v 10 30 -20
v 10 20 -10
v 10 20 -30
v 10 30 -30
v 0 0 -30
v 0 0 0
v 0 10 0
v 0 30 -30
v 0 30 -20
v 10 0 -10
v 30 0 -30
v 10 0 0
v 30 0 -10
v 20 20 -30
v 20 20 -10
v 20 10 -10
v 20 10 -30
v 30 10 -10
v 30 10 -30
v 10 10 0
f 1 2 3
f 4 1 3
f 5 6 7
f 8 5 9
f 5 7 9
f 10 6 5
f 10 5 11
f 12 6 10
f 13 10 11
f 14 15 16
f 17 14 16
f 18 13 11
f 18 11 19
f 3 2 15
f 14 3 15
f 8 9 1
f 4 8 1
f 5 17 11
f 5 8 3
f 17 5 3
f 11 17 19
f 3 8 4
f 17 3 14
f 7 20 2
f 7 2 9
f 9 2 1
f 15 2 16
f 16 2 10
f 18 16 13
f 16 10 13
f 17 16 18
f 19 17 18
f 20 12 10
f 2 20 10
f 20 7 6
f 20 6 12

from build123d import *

# Parameters (mm, degrees)
SKETCH_1_W               = 30
SKETCH_1_H               = 30
EXTRUDE_1_DEPTH          = 30
CUT_EXTRUDE_8_DEPTH      = 52.961524227
CUT_EXTRUDE_9_DEPTH      = 47.904157598
CUT_EXTRUDE_9_DEPTH_BACK = 47.904157598
SKETCH_16_W              = 20
SKETCH_16_H              = 10
CUT_EXTRUDE_10_DEPTH     = 52.961524227


with BuildPart() as part:
    # 草圖1 → 填料-伸1 (new body)
    with BuildSketch(Plane.XY):
        with Locations((15, 15)):
            Rectangle(SKETCH_1_W, SKETCH_1_H)
    extrude(amount=-EXTRUDE_1_DEPTH)

    # 草圖11 → 除料-伸長8 (cut, through all)
    with BuildSketch(Plane.XY):
        Polygon((10, 30), (10, 20), (20, 20), (20, 10), (30, 10), (30, 30), align=None)
    extrude(amount=-CUT_EXTRUDE_8_DEPTH, mode=Mode.SUBTRACT)

    # 草圖16 → 除料-伸長9 (cut, two sides: drawn at the far end of the back side and taken through both)
    with BuildSketch(Plane(origin=(0, 10, 0), x_dir=(1, 0, 0), z_dir=(0, 1, 0)).offset(-CUT_EXTRUDE_9_DEPTH_BACK)):
        with Locations((20, 5)):
            Rectangle(SKETCH_16_W, SKETCH_16_H)
    extrude(amount=CUT_EXTRUDE_9_DEPTH + CUT_EXTRUDE_9_DEPTH_BACK, mode=Mode.SUBTRACT)

    # 草圖20 → 除料-伸長10 (cut, through all)
    with BuildSketch(Plane(origin=(30, 0, 0), x_dir=(0, 0, -1), z_dir=(1, 0, 0))):
        Polygon((0, 30), (0, 10), (20, 30), align=None)
    extrude(amount=-CUT_EXTRUDE_10_DEPTH, mode=Mode.SUBTRACT)


solid = part.part
